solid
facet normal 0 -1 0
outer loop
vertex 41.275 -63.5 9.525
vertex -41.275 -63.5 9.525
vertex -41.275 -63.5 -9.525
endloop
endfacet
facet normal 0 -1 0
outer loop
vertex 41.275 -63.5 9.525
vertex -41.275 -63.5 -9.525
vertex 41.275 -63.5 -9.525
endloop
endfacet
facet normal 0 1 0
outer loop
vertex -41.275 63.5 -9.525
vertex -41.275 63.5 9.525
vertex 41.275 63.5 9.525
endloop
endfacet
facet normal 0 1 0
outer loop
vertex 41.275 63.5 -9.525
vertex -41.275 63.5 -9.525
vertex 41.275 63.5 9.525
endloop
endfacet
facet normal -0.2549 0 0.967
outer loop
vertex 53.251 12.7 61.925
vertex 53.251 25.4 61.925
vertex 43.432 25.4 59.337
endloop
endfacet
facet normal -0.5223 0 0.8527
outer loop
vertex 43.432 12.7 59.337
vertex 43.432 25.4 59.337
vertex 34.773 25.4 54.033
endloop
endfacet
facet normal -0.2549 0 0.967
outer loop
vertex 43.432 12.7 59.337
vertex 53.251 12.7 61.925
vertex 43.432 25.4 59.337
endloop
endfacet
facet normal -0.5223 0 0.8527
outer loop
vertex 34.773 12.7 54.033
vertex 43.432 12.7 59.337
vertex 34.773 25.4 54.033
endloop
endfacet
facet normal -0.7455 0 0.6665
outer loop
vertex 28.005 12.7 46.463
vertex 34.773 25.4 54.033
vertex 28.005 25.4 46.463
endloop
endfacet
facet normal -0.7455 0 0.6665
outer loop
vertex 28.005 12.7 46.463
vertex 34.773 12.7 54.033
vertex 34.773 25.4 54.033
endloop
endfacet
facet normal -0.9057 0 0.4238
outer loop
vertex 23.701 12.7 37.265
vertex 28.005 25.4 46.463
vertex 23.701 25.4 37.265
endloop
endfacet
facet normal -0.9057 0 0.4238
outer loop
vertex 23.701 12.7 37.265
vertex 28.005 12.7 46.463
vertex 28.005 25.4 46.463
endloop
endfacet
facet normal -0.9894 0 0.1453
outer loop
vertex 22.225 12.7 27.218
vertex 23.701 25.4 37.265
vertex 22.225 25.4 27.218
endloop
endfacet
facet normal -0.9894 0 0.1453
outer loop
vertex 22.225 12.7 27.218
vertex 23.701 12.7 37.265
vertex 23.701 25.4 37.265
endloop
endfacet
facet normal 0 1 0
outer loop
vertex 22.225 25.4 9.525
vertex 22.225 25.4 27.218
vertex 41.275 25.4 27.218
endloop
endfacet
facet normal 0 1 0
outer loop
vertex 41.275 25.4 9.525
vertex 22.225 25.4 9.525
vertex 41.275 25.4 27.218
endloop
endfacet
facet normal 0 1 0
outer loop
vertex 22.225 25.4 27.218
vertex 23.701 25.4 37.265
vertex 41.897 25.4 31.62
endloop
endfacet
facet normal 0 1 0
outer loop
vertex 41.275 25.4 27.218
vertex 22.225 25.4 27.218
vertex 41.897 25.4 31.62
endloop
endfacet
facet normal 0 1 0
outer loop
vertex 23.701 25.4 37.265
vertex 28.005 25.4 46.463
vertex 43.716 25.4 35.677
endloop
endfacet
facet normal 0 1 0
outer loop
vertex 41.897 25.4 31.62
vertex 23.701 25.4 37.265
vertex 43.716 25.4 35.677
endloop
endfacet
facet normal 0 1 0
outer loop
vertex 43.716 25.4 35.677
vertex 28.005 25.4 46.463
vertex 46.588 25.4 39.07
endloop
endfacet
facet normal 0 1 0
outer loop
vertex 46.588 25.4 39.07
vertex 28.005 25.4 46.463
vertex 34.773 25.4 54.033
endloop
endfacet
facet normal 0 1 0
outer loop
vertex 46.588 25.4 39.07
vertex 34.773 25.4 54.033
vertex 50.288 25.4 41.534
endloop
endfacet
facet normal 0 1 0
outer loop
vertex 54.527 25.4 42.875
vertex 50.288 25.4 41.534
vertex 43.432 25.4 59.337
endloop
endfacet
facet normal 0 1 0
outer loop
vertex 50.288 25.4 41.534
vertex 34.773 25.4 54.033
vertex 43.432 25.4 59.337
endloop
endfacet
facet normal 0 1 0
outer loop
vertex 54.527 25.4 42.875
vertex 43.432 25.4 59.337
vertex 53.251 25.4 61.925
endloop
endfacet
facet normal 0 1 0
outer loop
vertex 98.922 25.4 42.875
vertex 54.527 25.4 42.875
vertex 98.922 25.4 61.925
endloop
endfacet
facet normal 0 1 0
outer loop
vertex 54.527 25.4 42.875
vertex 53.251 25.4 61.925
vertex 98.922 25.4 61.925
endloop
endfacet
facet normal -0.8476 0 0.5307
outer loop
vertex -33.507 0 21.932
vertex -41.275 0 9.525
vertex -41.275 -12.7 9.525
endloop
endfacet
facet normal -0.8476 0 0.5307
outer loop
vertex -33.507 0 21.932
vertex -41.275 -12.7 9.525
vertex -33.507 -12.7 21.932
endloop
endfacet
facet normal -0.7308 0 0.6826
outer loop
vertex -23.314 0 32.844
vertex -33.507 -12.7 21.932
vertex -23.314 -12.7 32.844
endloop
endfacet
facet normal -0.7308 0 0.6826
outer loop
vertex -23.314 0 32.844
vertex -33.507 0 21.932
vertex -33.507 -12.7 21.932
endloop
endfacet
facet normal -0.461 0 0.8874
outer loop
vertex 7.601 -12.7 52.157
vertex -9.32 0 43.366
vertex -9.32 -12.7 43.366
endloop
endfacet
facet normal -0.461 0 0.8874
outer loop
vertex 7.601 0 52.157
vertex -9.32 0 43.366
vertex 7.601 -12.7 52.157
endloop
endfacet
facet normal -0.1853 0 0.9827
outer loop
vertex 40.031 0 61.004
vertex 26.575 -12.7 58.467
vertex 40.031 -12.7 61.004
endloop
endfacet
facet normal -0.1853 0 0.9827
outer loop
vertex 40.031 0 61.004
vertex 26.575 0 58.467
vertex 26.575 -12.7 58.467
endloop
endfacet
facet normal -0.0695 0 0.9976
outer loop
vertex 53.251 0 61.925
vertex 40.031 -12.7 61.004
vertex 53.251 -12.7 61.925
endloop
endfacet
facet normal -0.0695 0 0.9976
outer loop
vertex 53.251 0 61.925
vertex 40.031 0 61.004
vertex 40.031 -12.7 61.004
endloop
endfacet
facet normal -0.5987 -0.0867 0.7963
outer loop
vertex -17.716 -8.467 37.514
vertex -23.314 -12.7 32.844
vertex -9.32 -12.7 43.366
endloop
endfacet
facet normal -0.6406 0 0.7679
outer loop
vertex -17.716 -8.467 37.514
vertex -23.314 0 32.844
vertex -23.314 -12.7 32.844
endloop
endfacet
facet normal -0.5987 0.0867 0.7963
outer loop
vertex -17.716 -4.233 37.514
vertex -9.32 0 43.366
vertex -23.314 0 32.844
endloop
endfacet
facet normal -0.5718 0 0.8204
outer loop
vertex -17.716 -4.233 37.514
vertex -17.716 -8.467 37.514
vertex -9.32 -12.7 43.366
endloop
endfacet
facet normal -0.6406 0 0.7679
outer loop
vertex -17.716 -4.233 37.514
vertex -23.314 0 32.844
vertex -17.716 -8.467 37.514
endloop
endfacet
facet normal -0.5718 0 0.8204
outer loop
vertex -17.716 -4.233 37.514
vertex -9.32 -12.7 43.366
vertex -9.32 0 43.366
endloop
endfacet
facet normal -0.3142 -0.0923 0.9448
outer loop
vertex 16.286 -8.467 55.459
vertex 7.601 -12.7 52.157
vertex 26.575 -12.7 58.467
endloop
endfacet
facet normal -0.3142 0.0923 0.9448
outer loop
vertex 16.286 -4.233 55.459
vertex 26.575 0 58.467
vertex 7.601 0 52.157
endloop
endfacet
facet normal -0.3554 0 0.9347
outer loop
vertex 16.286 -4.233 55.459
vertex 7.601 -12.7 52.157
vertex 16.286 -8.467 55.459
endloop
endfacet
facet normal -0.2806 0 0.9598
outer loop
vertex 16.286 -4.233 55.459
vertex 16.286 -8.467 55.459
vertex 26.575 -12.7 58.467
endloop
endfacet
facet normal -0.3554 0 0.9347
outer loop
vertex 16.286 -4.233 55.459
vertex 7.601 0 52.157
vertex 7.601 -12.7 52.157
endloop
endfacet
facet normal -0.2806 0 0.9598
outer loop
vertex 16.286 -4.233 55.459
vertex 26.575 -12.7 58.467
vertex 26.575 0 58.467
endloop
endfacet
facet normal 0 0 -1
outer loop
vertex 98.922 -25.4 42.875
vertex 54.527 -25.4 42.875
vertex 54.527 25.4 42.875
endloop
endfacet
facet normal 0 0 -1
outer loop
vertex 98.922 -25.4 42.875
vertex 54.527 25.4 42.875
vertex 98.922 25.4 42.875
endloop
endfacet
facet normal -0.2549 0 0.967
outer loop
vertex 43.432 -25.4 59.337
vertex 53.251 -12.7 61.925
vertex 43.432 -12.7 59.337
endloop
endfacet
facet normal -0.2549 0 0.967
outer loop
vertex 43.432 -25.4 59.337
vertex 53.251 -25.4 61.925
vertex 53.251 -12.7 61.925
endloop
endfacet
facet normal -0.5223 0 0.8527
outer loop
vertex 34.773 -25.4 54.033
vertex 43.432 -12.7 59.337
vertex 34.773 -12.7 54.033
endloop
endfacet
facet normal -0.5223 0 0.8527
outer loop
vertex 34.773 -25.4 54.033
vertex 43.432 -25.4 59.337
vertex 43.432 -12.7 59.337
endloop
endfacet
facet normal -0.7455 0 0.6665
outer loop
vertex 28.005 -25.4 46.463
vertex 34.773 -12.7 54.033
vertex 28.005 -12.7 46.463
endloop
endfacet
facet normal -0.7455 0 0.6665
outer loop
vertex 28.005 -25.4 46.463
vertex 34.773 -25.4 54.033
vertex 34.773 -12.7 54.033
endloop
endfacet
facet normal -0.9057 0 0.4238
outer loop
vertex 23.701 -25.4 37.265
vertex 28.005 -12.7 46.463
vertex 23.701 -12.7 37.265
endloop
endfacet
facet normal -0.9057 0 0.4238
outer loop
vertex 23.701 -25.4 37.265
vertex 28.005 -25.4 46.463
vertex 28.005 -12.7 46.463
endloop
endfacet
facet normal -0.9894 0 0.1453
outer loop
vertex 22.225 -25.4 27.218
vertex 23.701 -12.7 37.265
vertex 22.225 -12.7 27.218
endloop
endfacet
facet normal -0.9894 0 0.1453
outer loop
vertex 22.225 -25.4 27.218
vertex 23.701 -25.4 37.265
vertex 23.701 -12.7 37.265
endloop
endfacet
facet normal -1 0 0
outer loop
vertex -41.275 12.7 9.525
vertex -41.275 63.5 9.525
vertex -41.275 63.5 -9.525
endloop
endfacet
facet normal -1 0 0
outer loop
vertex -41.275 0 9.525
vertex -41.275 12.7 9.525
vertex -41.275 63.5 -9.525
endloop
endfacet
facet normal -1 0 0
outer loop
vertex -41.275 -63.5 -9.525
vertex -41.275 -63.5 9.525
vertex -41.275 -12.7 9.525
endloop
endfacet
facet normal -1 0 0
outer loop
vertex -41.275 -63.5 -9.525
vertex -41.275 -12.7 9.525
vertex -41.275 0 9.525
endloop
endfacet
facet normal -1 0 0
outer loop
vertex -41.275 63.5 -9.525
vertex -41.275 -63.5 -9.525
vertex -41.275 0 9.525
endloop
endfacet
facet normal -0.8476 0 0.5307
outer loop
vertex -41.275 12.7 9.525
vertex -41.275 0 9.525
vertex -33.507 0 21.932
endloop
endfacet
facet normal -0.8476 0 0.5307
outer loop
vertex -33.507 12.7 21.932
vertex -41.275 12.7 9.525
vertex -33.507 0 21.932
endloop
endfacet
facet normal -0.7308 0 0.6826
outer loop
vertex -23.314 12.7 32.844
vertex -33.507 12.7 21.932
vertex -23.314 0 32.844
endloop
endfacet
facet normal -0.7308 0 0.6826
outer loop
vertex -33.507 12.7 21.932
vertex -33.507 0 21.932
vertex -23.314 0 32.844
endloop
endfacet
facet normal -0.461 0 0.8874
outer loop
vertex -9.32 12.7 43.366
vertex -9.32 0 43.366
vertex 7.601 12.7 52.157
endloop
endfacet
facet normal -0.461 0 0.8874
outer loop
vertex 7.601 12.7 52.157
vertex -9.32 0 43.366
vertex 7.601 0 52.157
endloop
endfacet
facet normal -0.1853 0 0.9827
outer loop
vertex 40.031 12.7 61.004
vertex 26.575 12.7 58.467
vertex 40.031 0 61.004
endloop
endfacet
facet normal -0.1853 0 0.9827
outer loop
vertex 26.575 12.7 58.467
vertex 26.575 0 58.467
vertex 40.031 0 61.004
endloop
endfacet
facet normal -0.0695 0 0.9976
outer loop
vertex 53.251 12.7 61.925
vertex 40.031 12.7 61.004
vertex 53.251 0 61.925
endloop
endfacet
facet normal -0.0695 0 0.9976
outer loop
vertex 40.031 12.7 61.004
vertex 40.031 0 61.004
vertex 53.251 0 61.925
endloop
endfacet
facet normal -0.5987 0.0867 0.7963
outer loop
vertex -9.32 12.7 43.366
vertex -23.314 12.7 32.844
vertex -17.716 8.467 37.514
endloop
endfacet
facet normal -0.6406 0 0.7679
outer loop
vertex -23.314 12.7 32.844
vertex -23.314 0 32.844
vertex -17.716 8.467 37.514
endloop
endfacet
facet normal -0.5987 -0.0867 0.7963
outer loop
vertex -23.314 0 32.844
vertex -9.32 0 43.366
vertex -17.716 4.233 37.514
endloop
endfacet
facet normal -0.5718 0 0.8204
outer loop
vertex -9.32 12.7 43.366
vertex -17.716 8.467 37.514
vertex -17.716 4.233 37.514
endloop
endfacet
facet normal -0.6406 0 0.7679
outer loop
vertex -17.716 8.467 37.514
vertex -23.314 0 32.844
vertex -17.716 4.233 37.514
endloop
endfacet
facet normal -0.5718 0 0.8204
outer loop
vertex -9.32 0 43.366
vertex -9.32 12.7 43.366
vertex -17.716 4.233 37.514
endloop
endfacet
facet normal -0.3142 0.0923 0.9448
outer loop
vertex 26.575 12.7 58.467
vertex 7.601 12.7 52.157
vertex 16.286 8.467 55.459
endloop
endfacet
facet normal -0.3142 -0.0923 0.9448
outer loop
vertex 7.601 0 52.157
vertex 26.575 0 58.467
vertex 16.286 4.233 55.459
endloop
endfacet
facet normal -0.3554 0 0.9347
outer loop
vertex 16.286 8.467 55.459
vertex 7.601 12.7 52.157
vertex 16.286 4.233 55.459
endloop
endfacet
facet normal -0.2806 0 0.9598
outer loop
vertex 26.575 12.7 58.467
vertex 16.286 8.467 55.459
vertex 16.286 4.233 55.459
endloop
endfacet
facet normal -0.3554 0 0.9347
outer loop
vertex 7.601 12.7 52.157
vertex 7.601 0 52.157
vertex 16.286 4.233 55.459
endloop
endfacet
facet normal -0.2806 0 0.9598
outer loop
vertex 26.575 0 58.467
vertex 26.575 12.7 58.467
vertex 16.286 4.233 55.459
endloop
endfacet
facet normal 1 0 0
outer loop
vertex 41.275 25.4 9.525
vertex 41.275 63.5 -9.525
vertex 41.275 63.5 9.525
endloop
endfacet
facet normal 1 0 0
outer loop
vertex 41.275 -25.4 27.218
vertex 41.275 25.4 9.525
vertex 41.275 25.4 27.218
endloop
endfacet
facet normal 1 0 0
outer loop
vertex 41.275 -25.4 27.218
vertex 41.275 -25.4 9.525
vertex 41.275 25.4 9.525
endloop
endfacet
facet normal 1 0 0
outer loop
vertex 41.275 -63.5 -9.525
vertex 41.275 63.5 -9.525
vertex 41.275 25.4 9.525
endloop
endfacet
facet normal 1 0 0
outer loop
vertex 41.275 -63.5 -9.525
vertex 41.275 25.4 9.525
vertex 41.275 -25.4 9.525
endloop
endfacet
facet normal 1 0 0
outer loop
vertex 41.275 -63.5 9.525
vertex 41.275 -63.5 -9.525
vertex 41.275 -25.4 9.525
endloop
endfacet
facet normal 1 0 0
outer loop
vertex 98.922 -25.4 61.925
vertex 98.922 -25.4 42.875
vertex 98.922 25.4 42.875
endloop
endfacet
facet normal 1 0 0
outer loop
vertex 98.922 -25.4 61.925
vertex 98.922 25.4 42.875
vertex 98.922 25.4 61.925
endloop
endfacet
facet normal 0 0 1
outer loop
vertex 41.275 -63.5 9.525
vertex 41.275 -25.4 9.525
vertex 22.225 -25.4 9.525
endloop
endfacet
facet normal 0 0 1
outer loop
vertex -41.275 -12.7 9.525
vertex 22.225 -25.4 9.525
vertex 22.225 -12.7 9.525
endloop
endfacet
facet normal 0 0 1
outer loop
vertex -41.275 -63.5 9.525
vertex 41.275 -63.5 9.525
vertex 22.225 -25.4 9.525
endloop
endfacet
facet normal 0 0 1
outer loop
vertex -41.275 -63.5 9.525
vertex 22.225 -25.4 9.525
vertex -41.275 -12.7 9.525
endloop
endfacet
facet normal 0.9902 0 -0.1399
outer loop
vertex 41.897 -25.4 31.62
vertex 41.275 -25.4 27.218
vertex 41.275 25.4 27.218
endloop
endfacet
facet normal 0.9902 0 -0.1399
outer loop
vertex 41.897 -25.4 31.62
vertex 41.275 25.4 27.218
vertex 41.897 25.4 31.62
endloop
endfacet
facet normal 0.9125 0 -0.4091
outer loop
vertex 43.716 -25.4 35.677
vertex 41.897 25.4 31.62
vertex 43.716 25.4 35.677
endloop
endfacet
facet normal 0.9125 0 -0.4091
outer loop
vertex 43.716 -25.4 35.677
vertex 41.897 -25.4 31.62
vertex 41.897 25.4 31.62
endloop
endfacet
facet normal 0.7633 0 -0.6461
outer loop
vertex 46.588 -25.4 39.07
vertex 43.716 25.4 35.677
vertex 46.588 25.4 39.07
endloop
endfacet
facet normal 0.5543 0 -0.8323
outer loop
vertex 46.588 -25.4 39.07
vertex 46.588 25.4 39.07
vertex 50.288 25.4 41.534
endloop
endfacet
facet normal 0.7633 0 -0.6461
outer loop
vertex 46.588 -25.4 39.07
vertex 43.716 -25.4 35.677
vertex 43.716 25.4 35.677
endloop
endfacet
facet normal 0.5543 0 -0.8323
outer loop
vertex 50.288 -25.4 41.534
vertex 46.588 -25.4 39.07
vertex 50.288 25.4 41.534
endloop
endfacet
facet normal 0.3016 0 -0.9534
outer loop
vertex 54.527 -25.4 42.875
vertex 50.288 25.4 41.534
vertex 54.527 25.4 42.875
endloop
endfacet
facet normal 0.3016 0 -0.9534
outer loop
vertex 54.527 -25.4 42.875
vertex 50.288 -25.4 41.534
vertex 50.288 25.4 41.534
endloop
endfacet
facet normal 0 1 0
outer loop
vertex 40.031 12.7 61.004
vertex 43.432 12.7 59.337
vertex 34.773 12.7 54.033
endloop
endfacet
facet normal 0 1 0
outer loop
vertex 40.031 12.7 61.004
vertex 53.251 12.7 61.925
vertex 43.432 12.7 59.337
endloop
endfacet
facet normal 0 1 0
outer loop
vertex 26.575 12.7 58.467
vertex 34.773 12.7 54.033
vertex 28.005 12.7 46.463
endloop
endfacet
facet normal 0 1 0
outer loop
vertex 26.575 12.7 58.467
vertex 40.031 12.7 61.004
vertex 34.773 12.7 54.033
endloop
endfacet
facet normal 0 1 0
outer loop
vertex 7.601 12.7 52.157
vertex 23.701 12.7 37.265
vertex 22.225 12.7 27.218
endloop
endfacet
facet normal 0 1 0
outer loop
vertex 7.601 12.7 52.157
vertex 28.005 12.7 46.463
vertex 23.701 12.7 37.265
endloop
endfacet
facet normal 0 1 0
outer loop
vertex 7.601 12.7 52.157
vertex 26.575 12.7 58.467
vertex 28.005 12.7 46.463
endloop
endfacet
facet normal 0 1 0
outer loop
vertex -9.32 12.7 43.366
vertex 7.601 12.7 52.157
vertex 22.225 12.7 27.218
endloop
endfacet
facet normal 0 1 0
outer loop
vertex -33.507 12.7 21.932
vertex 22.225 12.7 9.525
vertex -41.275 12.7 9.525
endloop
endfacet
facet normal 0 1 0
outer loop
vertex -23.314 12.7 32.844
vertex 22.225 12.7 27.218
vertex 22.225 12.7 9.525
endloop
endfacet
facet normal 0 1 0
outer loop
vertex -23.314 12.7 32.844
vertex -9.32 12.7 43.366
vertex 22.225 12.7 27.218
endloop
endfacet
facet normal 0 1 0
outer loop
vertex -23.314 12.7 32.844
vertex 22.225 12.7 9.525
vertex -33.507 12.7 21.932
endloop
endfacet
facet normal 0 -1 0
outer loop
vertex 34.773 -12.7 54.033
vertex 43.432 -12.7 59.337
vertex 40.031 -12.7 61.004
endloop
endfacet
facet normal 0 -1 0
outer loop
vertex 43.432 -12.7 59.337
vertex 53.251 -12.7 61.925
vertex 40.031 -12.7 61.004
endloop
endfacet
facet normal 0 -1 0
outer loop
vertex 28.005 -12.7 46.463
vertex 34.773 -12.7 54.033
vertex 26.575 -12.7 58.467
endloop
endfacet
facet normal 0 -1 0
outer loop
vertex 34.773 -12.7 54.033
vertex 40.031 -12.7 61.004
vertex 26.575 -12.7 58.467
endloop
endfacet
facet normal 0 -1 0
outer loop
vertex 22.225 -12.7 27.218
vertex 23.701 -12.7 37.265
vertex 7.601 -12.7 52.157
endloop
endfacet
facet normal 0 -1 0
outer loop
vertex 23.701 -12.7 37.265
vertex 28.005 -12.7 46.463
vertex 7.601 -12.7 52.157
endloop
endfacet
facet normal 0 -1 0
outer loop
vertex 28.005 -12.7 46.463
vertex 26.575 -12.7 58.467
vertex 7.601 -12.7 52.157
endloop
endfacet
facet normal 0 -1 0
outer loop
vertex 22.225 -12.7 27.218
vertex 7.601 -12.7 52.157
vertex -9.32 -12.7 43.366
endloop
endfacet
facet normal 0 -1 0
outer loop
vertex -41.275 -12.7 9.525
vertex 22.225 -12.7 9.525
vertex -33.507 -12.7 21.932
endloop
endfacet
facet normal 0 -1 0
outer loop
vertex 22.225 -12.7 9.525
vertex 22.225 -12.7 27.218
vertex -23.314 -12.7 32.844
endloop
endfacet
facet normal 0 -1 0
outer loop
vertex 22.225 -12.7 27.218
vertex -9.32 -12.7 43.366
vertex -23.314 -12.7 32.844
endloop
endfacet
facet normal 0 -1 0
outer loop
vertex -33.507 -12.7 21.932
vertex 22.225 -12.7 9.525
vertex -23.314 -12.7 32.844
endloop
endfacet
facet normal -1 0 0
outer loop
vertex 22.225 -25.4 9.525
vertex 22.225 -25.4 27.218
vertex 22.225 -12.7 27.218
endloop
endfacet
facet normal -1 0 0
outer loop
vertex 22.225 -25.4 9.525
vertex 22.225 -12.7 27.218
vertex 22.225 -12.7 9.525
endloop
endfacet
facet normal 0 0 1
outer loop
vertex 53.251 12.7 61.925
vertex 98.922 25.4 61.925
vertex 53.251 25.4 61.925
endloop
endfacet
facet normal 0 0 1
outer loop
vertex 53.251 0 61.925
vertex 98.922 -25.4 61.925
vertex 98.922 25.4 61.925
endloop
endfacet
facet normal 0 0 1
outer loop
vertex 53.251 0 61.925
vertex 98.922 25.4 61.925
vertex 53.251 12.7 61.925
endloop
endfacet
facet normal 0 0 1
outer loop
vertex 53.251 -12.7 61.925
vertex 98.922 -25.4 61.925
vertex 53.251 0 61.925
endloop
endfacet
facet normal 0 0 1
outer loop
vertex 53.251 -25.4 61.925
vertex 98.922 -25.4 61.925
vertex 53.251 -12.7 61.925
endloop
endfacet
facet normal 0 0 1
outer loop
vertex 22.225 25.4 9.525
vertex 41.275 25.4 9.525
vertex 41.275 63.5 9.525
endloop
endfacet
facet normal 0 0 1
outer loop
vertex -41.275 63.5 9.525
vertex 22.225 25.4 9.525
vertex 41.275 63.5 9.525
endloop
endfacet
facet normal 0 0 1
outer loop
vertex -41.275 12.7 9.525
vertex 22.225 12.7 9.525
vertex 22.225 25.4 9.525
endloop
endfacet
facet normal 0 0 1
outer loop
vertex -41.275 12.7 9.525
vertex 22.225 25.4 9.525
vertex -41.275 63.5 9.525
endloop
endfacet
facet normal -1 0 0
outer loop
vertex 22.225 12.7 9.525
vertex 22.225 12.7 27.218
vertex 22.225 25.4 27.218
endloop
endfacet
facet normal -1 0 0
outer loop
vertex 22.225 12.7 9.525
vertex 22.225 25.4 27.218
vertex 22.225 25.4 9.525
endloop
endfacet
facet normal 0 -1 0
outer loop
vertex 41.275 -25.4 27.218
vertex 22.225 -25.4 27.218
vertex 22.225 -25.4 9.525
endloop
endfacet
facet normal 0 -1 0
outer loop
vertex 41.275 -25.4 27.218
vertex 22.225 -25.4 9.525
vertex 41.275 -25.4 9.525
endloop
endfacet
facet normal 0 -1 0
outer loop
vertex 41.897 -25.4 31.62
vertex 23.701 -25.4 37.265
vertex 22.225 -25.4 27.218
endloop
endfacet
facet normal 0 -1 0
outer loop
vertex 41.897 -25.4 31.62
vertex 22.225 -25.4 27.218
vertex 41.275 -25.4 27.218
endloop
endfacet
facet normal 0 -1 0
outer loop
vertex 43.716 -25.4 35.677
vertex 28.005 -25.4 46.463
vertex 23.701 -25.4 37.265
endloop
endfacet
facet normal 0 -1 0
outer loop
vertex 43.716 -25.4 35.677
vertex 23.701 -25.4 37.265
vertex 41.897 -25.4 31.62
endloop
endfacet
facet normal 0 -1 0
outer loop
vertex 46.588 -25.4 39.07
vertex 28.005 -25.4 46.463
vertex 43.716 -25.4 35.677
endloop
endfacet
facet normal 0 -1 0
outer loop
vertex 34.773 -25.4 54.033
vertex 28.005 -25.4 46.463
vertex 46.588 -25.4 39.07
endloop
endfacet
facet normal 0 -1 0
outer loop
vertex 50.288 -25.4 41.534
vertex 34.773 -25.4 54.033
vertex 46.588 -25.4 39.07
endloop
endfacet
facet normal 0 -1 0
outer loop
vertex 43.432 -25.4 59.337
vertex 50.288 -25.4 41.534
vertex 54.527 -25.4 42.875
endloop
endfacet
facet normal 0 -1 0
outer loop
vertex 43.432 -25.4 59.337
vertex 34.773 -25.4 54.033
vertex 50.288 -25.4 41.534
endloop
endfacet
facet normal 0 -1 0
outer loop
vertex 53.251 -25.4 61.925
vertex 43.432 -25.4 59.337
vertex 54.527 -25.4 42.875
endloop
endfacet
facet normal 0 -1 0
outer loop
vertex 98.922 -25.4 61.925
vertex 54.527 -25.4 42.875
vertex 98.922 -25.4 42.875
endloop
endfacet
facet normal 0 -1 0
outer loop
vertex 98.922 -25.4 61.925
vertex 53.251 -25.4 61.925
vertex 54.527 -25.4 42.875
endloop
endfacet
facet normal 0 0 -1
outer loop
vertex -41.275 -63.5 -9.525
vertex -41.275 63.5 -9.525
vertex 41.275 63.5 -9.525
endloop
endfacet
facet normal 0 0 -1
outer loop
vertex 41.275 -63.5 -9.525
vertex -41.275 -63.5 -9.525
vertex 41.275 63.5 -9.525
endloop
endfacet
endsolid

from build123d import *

# Parameters (mm, degrees)
F1_DEPTH = 63.5
F0_W     = 38.5974588745
F0_H     = 19.05
F2_DEPTH = 25.4
F3_DEPTH = 12.7


with BuildPart() as f1:
    # F0 (on Front) → F1 (new body, symmetric)
    with BuildSketch(Plane.XZ):
        Polygon((22.225, 9.525), (-41.275, 9.525), (-41.275, -9.525), (41.275, -9.525), (41.275, 9.525), align=None)
    extrude(amount=F1_DEPTH, both=True)

    # F0 (on Front) → F2 (join, symmetric)
    with BuildSketch(Plane.XZ):
        with BuildLine():
            Line((22.225, 27.2184735426), (22.225, 9.525))
            Line((22.225, 9.525), (41.275, 9.525))
            Line((41.275, 9.525), (41.275, 27.2184735426))
            ThreePointArc((41.275, 27.2184735426), (45.032594125, 37.4744035277), (54.5265401398, 42.8752))
            Line((54.5265401398, 42.8752), (60.325, 42.8752))
            Line((60.325, 42.8752), (60.325, 61.9252))
            Line((60.325, 61.9252), (53.2514408289, 61.9252))
            ThreePointArc((53.2514408289, 61.9252), (31.1124040659, 50.495054541), (22.225, 27.2184735426))
        make_face()
        with Locations((79.6237294372, 52.4002)):
            Rectangle(F0_W, F0_H)
    extrude(amount=F2_DEPTH, both=True)

    # F0 (on Front) → F3 (join, symmetric)
    with BuildSketch(Plane.XZ):
        with BuildLine():
            add(Edge.make_bspline(
                [(-41.275, 9.525), (-25.43013841, 42.0579750838), (17.2982045757, 61.6761899298), (53.2514408289, 61.9252)],
                knots=[0, 0, 0, 0, 108.0788090969, 108.0788090969, 108.0788090969, 108.0788090969], degree=3))
            Line((-41.275, 9.525), (22.225, 9.525))
            Line((22.225, 9.525), (22.225, 27.2184735426))
            ThreePointArc((22.225, 27.2184735426), (31.1124040659, 50.495054541), (53.2514408289, 61.9252))
        make_face()
    extrude(amount=F3_DEPTH, both=True)


solid = f1.part
